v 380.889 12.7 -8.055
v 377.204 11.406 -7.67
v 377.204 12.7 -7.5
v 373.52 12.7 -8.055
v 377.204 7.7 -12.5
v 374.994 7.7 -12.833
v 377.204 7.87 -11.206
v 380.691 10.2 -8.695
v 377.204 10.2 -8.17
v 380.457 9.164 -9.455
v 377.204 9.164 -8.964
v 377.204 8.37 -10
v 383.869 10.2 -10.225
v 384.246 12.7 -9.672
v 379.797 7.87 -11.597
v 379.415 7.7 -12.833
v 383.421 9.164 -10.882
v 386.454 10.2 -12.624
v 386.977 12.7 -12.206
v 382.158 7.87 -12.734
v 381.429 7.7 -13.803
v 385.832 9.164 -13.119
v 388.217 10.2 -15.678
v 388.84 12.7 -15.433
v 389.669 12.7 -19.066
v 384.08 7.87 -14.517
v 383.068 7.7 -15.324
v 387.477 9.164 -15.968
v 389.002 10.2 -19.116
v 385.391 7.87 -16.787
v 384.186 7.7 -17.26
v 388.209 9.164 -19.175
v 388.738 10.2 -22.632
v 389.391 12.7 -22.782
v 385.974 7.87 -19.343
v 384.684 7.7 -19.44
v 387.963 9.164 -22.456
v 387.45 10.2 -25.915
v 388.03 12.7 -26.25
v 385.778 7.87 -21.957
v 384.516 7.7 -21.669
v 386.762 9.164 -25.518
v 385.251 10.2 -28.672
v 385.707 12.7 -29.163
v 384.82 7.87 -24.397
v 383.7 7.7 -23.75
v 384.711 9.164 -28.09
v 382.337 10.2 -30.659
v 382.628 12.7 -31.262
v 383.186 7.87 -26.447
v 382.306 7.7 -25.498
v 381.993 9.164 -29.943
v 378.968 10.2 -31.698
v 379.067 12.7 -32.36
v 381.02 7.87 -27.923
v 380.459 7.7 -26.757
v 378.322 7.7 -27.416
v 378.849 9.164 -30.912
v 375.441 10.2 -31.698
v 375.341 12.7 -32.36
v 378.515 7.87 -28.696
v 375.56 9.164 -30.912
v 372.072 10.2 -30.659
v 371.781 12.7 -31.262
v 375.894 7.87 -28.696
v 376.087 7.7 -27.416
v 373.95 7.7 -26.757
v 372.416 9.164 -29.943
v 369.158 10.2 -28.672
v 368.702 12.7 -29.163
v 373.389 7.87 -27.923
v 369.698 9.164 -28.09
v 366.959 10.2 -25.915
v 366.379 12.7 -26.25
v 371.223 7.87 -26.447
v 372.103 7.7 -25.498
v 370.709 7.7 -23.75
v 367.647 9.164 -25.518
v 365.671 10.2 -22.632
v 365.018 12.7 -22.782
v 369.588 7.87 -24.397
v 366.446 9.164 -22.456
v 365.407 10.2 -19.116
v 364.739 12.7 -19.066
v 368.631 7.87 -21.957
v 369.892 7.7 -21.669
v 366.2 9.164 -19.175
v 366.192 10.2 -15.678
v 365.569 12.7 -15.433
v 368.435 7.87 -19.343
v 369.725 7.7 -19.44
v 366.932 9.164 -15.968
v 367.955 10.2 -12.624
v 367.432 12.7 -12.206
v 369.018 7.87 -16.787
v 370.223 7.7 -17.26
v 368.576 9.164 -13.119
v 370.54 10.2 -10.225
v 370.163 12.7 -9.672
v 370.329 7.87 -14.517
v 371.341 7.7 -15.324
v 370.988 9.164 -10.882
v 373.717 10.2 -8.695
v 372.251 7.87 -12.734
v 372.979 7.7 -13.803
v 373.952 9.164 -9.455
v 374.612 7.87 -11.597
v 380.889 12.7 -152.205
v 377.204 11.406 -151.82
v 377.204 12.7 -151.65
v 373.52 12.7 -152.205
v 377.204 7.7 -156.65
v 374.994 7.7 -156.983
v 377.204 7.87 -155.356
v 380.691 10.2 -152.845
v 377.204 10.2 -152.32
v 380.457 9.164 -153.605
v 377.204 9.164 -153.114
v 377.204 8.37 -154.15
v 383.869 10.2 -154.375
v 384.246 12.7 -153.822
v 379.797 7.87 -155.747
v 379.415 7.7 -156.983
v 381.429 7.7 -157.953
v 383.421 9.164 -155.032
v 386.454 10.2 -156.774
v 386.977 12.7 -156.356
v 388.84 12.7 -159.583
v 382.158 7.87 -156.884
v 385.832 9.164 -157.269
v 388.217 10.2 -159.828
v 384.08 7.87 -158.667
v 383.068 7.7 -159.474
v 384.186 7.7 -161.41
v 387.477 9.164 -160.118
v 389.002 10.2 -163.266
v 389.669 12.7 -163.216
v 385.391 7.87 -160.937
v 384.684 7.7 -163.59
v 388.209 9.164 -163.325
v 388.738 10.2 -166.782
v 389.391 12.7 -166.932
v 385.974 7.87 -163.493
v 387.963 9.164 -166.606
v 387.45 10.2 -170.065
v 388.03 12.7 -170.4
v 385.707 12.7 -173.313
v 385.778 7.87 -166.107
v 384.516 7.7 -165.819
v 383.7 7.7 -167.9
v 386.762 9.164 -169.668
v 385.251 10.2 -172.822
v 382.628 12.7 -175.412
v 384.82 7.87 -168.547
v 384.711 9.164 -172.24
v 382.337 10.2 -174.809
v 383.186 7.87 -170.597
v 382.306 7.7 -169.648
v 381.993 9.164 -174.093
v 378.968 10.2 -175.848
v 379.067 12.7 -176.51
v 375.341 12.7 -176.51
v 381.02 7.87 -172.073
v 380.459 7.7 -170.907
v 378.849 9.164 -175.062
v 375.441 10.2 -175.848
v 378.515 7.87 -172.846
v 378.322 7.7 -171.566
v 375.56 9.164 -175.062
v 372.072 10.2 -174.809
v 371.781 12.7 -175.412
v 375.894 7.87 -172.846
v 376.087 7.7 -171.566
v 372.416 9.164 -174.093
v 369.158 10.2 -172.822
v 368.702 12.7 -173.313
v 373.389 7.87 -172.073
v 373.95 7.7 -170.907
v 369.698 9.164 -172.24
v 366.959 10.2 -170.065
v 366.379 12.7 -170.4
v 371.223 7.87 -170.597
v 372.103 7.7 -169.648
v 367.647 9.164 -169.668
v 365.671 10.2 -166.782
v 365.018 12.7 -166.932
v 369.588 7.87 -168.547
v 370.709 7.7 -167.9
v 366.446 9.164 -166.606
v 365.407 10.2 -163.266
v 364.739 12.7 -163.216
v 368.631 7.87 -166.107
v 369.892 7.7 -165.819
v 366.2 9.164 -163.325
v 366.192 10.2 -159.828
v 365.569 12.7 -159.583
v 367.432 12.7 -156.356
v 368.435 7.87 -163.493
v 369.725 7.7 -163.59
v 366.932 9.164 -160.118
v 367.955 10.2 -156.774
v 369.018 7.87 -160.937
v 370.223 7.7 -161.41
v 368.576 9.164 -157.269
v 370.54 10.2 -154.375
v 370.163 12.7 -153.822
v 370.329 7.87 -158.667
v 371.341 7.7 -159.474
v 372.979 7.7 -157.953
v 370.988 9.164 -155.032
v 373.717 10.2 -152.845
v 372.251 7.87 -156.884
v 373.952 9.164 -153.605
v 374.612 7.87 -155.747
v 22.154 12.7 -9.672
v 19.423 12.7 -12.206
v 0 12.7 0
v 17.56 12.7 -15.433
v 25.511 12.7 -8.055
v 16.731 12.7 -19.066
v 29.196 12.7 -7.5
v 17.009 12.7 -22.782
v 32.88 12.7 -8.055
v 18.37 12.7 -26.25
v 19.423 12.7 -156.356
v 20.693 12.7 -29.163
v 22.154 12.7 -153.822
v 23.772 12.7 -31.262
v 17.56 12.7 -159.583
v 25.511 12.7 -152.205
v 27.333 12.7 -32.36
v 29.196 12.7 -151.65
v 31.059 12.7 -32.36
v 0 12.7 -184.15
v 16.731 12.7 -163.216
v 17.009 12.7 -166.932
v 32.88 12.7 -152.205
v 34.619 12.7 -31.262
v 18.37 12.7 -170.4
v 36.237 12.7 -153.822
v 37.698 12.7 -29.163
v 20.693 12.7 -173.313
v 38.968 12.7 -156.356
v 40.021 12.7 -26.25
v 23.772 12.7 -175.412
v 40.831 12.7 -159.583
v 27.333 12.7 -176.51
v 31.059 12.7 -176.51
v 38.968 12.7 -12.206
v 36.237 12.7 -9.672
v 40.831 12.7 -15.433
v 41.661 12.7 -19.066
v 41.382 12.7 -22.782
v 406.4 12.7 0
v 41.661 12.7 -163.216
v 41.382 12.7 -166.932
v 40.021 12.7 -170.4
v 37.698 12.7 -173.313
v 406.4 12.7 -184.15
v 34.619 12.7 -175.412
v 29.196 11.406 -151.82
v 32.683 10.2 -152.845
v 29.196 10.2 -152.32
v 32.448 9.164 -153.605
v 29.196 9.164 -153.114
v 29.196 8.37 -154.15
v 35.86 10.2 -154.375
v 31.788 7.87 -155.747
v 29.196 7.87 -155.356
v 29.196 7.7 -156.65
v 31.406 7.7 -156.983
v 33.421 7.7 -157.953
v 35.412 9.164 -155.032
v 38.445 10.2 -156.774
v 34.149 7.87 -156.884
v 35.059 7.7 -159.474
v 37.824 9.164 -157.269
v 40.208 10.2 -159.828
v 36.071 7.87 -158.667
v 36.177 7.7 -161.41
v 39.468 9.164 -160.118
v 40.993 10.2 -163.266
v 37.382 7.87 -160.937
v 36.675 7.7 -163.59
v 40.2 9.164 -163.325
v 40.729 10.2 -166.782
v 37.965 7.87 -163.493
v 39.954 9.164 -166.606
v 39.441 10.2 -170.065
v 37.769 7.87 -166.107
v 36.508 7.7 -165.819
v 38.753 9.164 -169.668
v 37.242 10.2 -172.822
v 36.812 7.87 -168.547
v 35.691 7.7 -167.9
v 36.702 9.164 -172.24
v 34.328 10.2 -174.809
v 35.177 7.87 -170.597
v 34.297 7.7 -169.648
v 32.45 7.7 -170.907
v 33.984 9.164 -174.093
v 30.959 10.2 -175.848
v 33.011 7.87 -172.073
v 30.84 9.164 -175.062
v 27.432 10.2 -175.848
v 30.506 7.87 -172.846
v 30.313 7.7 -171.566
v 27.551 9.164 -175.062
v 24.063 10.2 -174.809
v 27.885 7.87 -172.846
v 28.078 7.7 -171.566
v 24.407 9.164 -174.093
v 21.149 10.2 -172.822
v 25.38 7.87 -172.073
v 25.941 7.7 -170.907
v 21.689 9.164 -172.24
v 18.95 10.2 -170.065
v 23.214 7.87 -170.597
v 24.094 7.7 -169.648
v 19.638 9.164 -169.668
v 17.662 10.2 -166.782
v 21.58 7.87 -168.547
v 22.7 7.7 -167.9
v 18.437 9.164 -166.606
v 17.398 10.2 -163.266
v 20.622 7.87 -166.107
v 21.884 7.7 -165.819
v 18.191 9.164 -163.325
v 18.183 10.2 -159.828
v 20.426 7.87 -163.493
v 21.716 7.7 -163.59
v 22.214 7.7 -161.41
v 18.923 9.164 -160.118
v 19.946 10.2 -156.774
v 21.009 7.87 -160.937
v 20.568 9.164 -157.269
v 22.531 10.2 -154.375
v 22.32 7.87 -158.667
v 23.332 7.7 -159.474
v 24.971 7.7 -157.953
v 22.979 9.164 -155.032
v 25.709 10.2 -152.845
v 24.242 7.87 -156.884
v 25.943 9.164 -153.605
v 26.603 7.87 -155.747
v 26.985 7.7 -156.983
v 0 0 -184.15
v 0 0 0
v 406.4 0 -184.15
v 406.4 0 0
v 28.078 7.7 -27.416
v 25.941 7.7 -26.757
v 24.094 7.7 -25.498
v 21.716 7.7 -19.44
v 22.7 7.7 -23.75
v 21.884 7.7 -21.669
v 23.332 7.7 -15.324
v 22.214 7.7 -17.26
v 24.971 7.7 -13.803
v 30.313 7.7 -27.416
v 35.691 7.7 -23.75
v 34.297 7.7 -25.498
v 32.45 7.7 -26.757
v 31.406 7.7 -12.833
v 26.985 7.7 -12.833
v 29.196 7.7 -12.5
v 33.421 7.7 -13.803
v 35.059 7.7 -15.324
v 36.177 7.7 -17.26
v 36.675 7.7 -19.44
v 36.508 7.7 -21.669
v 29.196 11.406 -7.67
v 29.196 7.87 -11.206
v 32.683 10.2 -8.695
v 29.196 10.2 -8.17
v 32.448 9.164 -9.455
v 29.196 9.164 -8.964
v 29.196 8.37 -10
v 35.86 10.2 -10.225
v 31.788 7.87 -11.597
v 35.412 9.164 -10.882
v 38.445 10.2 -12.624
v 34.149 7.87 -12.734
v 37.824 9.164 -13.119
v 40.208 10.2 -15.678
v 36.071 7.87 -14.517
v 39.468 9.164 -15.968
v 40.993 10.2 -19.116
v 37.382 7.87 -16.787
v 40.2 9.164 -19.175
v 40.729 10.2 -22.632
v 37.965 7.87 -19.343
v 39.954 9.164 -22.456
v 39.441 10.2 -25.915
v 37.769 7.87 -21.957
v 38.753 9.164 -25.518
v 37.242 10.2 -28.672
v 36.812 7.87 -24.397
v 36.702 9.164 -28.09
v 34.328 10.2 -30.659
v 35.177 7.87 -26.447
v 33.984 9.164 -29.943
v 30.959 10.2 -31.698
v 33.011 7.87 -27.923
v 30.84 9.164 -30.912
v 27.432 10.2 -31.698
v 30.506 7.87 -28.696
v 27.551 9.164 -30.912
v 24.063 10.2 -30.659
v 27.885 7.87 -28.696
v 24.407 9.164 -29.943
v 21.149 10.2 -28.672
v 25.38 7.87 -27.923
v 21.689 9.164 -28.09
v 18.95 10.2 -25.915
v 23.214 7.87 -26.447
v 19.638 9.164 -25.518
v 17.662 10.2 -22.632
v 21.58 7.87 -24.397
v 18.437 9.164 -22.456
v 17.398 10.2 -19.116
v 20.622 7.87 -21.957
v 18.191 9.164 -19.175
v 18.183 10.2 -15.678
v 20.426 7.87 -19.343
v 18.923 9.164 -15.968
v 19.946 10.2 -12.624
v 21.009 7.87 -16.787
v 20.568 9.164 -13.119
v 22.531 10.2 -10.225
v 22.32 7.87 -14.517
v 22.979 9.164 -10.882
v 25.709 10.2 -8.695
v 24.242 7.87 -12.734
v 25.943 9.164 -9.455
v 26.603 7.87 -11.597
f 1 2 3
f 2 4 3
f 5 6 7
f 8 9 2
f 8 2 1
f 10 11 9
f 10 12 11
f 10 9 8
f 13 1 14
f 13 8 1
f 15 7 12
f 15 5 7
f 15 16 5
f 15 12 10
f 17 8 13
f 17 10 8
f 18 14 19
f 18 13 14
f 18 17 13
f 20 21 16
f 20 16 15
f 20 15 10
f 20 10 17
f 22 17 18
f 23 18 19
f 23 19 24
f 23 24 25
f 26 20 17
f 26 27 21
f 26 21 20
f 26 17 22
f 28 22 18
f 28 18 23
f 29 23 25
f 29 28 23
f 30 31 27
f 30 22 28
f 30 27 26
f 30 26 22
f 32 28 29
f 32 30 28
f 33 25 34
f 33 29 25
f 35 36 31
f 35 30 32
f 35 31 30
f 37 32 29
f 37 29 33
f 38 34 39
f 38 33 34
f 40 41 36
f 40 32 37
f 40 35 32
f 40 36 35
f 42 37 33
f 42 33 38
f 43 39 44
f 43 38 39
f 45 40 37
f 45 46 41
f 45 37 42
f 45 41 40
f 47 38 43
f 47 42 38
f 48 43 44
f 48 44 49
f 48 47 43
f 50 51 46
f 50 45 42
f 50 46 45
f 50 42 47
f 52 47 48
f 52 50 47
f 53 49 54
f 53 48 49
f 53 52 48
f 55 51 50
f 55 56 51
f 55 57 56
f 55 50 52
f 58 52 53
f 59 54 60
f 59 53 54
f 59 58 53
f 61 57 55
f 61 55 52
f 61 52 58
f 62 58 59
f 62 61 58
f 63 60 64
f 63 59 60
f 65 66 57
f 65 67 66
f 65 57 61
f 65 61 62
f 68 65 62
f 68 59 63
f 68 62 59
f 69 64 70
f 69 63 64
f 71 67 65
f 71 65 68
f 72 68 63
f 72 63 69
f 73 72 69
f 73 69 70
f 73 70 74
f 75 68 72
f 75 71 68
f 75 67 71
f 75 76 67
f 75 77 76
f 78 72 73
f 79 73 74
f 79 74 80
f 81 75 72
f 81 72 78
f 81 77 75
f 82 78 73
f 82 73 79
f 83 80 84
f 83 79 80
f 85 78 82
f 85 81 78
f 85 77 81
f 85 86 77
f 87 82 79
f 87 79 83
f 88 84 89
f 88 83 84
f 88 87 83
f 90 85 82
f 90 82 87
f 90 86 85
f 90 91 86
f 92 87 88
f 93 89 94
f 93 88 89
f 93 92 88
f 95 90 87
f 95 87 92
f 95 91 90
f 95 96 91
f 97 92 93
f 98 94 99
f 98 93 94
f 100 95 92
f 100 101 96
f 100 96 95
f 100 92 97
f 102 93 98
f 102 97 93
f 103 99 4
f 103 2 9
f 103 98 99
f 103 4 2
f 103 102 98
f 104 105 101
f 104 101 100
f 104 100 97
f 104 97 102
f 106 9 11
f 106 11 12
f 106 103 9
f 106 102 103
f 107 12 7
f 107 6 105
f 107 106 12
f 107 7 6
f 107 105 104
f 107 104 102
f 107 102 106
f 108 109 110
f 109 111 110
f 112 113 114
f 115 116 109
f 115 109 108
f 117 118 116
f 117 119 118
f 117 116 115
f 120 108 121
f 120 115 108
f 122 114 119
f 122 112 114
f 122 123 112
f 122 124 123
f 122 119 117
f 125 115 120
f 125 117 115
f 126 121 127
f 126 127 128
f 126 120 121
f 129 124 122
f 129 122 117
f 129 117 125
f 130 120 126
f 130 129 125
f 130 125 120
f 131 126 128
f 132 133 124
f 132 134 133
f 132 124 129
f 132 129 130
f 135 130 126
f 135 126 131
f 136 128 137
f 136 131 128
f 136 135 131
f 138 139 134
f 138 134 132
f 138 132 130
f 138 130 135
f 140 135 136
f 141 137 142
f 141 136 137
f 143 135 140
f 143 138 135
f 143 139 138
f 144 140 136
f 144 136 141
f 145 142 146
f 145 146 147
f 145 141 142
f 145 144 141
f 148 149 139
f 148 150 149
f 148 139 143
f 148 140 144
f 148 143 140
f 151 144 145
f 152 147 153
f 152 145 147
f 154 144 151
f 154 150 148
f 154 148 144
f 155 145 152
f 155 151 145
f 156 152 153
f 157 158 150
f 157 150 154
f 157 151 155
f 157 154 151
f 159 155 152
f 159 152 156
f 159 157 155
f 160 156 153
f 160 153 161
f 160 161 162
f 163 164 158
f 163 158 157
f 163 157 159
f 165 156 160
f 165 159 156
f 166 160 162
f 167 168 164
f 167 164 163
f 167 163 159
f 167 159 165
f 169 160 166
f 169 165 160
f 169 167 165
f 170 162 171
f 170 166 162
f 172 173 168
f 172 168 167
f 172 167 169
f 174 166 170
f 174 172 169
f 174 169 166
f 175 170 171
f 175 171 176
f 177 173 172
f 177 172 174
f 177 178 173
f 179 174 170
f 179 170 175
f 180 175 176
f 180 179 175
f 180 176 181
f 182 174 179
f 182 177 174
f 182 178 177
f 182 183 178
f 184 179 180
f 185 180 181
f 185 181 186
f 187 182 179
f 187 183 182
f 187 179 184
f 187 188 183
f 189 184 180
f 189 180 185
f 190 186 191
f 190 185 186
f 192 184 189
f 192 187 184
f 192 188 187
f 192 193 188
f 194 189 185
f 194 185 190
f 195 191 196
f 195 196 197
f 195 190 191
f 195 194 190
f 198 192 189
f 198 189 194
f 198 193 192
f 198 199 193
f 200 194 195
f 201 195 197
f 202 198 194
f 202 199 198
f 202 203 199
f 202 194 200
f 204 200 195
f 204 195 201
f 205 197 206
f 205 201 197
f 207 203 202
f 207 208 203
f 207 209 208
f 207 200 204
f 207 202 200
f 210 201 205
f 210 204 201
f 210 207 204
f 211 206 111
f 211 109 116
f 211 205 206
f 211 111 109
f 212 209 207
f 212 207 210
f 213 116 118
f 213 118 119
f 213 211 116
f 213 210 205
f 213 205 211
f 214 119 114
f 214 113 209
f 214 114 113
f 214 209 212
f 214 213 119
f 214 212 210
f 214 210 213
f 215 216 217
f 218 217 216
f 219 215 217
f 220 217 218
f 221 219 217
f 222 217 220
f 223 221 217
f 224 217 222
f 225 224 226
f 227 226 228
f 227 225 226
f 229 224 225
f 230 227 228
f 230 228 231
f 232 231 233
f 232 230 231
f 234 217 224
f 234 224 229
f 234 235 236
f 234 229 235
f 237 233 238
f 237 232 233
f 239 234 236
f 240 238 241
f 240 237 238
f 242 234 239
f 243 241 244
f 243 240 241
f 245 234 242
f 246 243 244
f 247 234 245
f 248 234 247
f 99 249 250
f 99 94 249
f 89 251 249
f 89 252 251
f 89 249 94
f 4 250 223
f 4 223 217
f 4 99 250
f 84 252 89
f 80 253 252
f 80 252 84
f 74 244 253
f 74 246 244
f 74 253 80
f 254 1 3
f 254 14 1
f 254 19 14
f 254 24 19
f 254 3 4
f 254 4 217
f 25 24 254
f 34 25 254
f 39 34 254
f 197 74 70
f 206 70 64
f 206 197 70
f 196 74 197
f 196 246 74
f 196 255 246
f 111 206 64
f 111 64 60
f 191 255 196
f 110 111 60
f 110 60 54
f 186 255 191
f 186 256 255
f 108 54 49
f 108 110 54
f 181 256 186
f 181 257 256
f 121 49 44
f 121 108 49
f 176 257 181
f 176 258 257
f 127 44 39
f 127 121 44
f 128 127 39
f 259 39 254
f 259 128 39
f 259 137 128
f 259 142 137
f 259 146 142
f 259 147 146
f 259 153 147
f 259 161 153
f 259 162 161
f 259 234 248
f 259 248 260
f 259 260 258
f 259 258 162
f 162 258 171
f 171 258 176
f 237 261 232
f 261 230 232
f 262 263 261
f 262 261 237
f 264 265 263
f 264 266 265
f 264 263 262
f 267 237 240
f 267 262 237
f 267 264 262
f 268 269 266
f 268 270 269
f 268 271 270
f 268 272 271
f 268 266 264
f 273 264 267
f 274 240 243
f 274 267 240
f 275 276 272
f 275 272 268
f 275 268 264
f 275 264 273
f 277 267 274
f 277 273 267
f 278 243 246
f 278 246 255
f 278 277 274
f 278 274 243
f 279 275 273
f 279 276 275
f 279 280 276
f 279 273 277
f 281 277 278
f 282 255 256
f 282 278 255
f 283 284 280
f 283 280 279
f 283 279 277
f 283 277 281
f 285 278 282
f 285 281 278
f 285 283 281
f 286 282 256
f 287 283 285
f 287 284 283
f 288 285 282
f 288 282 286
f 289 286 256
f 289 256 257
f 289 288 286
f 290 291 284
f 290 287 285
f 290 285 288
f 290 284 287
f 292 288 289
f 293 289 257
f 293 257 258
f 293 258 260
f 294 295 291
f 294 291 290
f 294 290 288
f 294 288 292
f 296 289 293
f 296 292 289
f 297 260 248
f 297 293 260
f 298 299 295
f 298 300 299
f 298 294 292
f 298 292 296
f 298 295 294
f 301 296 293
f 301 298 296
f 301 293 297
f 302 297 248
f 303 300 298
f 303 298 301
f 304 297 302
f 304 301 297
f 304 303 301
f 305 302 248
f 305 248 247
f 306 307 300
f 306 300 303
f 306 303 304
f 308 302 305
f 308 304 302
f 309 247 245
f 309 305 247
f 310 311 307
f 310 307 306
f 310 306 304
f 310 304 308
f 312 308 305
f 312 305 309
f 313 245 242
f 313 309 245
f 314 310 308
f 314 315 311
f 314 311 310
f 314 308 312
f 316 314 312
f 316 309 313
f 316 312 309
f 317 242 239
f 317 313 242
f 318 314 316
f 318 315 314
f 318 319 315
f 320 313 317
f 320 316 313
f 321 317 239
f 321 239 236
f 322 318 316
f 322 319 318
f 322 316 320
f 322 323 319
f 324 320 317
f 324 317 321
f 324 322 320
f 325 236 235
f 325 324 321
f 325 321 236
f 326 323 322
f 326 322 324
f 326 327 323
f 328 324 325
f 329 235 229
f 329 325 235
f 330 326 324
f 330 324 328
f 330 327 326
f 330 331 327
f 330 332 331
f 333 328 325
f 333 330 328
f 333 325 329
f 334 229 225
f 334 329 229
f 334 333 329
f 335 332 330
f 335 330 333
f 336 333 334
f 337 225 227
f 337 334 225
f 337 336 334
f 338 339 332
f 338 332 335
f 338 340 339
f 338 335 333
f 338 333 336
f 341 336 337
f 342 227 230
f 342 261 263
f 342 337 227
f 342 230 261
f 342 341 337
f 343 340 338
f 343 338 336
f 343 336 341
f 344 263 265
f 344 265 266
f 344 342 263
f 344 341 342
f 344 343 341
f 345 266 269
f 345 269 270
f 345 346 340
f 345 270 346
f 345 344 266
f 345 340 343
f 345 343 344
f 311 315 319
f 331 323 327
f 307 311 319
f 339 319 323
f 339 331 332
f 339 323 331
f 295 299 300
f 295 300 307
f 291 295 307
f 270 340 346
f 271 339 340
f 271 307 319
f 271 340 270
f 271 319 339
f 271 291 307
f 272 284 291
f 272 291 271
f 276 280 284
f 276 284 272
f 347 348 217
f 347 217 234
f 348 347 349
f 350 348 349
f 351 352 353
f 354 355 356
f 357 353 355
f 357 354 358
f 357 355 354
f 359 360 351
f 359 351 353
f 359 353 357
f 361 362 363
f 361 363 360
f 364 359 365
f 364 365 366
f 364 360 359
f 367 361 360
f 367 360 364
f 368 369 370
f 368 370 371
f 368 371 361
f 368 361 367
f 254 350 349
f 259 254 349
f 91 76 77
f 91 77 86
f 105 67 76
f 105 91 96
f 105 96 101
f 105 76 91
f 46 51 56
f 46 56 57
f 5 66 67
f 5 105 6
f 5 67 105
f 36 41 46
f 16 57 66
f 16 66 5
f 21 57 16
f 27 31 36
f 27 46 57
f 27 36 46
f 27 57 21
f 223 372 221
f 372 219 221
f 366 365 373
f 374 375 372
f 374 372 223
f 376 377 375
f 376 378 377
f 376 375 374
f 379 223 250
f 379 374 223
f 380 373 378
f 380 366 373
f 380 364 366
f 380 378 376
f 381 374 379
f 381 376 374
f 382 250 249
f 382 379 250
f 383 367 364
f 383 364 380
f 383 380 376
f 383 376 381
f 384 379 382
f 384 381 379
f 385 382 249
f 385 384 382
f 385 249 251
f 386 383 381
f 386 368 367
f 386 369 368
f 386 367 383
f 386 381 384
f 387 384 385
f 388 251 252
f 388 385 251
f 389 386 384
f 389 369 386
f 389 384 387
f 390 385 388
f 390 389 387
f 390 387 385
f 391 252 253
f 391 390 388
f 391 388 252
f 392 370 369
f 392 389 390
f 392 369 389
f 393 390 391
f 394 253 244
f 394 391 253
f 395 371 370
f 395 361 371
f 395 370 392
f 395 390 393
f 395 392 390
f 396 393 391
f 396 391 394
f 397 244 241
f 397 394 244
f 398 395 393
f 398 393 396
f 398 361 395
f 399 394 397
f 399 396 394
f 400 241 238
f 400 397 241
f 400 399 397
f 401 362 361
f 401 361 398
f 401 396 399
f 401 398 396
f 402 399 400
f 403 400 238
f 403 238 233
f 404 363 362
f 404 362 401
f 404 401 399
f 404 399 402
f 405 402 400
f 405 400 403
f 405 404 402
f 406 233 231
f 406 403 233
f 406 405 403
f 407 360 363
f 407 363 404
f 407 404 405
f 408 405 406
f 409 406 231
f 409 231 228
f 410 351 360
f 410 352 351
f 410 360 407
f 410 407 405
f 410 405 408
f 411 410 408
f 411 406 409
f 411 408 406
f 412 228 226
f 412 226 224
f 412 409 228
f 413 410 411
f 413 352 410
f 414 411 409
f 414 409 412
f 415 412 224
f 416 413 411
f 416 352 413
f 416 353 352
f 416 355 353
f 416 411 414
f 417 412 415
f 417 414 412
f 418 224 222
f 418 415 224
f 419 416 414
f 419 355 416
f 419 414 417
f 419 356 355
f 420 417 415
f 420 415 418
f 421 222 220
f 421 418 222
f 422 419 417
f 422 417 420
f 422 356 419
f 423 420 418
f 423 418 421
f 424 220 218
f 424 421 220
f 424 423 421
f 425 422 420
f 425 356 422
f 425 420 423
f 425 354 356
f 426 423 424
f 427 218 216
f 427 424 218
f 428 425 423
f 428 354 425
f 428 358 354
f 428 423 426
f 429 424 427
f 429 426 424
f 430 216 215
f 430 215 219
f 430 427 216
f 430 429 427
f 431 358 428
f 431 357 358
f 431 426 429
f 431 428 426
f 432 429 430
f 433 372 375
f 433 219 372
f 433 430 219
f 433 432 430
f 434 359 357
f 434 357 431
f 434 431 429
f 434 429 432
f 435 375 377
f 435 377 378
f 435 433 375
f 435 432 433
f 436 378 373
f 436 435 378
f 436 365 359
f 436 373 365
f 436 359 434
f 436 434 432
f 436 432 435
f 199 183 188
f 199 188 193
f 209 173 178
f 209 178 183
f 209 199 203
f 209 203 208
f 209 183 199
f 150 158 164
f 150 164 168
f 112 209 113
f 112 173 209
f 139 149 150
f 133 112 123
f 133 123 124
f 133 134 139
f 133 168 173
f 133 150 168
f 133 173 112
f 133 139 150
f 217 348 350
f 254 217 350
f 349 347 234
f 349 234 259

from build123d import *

# Parameters (mm, degrees)
SKETCH1_W           = 406.4
SKETCH1_H           = 184.15
BOSS_EXTRUDE1_DEPTH = 12.7
SKETCH2_R           = 12.5
CUT_EXTRUDE1_DEPTH  = 5
FILLET1_R           = 5


with BuildPart() as part:
    # Sketch1 → Boss-Extrude1 (new body)
    with BuildSketch(Plane(origin=(0, 0, 0), x_dir=(1, 0, 0), z_dir=(0, 1, 0))):
        with Locations((203.2, 92.075)):
            Rectangle(SKETCH1_W, SKETCH1_H)
    extrude(amount=BOSS_EXTRUDE1_DEPTH)

    # Sketch2 → Cut-Extrude1 (cut)
    with BuildSketch(Plane(origin=(0, 12.7, 0), x_dir=(1, 0, 0), z_dir=(0, 1, 0))):
        with Locations(Location((29.195557492, 20, 0), (0, 0, 270))):
            Circle(SKETCH2_R)
        with Locations(Location((377.204442508, 20, 0), (0, 0, 270))):
            Circle(SKETCH2_R)
        with Locations(Location((377.204442508, 164.15, 0), (0, 0, 270))):
            Circle(SKETCH2_R)
        with Locations(Location((29.195557492, 164.15, 0), (0, 0, 270))):
            Circle(SKETCH2_R)
    extrude(amount=-CUT_EXTRUDE1_DEPTH, mode=Mode.SUBTRACT)

    # Fillet1
    fillet1_edges = [part.edges().sort_by_distance(p)[0] for p in [
        (29.195557492, 7.7, -176.65),
        (377.204442508, 7.7, -176.65),
        (377.204442508, 7.7, -32.5),
        (29.195557492, 7.7, -32.5),
    ]]
    fillet(fillet1_edges, radius=FILLET1_R - 0.0001)  # a hair under: the kernel refuses the full size


solid = part.part
